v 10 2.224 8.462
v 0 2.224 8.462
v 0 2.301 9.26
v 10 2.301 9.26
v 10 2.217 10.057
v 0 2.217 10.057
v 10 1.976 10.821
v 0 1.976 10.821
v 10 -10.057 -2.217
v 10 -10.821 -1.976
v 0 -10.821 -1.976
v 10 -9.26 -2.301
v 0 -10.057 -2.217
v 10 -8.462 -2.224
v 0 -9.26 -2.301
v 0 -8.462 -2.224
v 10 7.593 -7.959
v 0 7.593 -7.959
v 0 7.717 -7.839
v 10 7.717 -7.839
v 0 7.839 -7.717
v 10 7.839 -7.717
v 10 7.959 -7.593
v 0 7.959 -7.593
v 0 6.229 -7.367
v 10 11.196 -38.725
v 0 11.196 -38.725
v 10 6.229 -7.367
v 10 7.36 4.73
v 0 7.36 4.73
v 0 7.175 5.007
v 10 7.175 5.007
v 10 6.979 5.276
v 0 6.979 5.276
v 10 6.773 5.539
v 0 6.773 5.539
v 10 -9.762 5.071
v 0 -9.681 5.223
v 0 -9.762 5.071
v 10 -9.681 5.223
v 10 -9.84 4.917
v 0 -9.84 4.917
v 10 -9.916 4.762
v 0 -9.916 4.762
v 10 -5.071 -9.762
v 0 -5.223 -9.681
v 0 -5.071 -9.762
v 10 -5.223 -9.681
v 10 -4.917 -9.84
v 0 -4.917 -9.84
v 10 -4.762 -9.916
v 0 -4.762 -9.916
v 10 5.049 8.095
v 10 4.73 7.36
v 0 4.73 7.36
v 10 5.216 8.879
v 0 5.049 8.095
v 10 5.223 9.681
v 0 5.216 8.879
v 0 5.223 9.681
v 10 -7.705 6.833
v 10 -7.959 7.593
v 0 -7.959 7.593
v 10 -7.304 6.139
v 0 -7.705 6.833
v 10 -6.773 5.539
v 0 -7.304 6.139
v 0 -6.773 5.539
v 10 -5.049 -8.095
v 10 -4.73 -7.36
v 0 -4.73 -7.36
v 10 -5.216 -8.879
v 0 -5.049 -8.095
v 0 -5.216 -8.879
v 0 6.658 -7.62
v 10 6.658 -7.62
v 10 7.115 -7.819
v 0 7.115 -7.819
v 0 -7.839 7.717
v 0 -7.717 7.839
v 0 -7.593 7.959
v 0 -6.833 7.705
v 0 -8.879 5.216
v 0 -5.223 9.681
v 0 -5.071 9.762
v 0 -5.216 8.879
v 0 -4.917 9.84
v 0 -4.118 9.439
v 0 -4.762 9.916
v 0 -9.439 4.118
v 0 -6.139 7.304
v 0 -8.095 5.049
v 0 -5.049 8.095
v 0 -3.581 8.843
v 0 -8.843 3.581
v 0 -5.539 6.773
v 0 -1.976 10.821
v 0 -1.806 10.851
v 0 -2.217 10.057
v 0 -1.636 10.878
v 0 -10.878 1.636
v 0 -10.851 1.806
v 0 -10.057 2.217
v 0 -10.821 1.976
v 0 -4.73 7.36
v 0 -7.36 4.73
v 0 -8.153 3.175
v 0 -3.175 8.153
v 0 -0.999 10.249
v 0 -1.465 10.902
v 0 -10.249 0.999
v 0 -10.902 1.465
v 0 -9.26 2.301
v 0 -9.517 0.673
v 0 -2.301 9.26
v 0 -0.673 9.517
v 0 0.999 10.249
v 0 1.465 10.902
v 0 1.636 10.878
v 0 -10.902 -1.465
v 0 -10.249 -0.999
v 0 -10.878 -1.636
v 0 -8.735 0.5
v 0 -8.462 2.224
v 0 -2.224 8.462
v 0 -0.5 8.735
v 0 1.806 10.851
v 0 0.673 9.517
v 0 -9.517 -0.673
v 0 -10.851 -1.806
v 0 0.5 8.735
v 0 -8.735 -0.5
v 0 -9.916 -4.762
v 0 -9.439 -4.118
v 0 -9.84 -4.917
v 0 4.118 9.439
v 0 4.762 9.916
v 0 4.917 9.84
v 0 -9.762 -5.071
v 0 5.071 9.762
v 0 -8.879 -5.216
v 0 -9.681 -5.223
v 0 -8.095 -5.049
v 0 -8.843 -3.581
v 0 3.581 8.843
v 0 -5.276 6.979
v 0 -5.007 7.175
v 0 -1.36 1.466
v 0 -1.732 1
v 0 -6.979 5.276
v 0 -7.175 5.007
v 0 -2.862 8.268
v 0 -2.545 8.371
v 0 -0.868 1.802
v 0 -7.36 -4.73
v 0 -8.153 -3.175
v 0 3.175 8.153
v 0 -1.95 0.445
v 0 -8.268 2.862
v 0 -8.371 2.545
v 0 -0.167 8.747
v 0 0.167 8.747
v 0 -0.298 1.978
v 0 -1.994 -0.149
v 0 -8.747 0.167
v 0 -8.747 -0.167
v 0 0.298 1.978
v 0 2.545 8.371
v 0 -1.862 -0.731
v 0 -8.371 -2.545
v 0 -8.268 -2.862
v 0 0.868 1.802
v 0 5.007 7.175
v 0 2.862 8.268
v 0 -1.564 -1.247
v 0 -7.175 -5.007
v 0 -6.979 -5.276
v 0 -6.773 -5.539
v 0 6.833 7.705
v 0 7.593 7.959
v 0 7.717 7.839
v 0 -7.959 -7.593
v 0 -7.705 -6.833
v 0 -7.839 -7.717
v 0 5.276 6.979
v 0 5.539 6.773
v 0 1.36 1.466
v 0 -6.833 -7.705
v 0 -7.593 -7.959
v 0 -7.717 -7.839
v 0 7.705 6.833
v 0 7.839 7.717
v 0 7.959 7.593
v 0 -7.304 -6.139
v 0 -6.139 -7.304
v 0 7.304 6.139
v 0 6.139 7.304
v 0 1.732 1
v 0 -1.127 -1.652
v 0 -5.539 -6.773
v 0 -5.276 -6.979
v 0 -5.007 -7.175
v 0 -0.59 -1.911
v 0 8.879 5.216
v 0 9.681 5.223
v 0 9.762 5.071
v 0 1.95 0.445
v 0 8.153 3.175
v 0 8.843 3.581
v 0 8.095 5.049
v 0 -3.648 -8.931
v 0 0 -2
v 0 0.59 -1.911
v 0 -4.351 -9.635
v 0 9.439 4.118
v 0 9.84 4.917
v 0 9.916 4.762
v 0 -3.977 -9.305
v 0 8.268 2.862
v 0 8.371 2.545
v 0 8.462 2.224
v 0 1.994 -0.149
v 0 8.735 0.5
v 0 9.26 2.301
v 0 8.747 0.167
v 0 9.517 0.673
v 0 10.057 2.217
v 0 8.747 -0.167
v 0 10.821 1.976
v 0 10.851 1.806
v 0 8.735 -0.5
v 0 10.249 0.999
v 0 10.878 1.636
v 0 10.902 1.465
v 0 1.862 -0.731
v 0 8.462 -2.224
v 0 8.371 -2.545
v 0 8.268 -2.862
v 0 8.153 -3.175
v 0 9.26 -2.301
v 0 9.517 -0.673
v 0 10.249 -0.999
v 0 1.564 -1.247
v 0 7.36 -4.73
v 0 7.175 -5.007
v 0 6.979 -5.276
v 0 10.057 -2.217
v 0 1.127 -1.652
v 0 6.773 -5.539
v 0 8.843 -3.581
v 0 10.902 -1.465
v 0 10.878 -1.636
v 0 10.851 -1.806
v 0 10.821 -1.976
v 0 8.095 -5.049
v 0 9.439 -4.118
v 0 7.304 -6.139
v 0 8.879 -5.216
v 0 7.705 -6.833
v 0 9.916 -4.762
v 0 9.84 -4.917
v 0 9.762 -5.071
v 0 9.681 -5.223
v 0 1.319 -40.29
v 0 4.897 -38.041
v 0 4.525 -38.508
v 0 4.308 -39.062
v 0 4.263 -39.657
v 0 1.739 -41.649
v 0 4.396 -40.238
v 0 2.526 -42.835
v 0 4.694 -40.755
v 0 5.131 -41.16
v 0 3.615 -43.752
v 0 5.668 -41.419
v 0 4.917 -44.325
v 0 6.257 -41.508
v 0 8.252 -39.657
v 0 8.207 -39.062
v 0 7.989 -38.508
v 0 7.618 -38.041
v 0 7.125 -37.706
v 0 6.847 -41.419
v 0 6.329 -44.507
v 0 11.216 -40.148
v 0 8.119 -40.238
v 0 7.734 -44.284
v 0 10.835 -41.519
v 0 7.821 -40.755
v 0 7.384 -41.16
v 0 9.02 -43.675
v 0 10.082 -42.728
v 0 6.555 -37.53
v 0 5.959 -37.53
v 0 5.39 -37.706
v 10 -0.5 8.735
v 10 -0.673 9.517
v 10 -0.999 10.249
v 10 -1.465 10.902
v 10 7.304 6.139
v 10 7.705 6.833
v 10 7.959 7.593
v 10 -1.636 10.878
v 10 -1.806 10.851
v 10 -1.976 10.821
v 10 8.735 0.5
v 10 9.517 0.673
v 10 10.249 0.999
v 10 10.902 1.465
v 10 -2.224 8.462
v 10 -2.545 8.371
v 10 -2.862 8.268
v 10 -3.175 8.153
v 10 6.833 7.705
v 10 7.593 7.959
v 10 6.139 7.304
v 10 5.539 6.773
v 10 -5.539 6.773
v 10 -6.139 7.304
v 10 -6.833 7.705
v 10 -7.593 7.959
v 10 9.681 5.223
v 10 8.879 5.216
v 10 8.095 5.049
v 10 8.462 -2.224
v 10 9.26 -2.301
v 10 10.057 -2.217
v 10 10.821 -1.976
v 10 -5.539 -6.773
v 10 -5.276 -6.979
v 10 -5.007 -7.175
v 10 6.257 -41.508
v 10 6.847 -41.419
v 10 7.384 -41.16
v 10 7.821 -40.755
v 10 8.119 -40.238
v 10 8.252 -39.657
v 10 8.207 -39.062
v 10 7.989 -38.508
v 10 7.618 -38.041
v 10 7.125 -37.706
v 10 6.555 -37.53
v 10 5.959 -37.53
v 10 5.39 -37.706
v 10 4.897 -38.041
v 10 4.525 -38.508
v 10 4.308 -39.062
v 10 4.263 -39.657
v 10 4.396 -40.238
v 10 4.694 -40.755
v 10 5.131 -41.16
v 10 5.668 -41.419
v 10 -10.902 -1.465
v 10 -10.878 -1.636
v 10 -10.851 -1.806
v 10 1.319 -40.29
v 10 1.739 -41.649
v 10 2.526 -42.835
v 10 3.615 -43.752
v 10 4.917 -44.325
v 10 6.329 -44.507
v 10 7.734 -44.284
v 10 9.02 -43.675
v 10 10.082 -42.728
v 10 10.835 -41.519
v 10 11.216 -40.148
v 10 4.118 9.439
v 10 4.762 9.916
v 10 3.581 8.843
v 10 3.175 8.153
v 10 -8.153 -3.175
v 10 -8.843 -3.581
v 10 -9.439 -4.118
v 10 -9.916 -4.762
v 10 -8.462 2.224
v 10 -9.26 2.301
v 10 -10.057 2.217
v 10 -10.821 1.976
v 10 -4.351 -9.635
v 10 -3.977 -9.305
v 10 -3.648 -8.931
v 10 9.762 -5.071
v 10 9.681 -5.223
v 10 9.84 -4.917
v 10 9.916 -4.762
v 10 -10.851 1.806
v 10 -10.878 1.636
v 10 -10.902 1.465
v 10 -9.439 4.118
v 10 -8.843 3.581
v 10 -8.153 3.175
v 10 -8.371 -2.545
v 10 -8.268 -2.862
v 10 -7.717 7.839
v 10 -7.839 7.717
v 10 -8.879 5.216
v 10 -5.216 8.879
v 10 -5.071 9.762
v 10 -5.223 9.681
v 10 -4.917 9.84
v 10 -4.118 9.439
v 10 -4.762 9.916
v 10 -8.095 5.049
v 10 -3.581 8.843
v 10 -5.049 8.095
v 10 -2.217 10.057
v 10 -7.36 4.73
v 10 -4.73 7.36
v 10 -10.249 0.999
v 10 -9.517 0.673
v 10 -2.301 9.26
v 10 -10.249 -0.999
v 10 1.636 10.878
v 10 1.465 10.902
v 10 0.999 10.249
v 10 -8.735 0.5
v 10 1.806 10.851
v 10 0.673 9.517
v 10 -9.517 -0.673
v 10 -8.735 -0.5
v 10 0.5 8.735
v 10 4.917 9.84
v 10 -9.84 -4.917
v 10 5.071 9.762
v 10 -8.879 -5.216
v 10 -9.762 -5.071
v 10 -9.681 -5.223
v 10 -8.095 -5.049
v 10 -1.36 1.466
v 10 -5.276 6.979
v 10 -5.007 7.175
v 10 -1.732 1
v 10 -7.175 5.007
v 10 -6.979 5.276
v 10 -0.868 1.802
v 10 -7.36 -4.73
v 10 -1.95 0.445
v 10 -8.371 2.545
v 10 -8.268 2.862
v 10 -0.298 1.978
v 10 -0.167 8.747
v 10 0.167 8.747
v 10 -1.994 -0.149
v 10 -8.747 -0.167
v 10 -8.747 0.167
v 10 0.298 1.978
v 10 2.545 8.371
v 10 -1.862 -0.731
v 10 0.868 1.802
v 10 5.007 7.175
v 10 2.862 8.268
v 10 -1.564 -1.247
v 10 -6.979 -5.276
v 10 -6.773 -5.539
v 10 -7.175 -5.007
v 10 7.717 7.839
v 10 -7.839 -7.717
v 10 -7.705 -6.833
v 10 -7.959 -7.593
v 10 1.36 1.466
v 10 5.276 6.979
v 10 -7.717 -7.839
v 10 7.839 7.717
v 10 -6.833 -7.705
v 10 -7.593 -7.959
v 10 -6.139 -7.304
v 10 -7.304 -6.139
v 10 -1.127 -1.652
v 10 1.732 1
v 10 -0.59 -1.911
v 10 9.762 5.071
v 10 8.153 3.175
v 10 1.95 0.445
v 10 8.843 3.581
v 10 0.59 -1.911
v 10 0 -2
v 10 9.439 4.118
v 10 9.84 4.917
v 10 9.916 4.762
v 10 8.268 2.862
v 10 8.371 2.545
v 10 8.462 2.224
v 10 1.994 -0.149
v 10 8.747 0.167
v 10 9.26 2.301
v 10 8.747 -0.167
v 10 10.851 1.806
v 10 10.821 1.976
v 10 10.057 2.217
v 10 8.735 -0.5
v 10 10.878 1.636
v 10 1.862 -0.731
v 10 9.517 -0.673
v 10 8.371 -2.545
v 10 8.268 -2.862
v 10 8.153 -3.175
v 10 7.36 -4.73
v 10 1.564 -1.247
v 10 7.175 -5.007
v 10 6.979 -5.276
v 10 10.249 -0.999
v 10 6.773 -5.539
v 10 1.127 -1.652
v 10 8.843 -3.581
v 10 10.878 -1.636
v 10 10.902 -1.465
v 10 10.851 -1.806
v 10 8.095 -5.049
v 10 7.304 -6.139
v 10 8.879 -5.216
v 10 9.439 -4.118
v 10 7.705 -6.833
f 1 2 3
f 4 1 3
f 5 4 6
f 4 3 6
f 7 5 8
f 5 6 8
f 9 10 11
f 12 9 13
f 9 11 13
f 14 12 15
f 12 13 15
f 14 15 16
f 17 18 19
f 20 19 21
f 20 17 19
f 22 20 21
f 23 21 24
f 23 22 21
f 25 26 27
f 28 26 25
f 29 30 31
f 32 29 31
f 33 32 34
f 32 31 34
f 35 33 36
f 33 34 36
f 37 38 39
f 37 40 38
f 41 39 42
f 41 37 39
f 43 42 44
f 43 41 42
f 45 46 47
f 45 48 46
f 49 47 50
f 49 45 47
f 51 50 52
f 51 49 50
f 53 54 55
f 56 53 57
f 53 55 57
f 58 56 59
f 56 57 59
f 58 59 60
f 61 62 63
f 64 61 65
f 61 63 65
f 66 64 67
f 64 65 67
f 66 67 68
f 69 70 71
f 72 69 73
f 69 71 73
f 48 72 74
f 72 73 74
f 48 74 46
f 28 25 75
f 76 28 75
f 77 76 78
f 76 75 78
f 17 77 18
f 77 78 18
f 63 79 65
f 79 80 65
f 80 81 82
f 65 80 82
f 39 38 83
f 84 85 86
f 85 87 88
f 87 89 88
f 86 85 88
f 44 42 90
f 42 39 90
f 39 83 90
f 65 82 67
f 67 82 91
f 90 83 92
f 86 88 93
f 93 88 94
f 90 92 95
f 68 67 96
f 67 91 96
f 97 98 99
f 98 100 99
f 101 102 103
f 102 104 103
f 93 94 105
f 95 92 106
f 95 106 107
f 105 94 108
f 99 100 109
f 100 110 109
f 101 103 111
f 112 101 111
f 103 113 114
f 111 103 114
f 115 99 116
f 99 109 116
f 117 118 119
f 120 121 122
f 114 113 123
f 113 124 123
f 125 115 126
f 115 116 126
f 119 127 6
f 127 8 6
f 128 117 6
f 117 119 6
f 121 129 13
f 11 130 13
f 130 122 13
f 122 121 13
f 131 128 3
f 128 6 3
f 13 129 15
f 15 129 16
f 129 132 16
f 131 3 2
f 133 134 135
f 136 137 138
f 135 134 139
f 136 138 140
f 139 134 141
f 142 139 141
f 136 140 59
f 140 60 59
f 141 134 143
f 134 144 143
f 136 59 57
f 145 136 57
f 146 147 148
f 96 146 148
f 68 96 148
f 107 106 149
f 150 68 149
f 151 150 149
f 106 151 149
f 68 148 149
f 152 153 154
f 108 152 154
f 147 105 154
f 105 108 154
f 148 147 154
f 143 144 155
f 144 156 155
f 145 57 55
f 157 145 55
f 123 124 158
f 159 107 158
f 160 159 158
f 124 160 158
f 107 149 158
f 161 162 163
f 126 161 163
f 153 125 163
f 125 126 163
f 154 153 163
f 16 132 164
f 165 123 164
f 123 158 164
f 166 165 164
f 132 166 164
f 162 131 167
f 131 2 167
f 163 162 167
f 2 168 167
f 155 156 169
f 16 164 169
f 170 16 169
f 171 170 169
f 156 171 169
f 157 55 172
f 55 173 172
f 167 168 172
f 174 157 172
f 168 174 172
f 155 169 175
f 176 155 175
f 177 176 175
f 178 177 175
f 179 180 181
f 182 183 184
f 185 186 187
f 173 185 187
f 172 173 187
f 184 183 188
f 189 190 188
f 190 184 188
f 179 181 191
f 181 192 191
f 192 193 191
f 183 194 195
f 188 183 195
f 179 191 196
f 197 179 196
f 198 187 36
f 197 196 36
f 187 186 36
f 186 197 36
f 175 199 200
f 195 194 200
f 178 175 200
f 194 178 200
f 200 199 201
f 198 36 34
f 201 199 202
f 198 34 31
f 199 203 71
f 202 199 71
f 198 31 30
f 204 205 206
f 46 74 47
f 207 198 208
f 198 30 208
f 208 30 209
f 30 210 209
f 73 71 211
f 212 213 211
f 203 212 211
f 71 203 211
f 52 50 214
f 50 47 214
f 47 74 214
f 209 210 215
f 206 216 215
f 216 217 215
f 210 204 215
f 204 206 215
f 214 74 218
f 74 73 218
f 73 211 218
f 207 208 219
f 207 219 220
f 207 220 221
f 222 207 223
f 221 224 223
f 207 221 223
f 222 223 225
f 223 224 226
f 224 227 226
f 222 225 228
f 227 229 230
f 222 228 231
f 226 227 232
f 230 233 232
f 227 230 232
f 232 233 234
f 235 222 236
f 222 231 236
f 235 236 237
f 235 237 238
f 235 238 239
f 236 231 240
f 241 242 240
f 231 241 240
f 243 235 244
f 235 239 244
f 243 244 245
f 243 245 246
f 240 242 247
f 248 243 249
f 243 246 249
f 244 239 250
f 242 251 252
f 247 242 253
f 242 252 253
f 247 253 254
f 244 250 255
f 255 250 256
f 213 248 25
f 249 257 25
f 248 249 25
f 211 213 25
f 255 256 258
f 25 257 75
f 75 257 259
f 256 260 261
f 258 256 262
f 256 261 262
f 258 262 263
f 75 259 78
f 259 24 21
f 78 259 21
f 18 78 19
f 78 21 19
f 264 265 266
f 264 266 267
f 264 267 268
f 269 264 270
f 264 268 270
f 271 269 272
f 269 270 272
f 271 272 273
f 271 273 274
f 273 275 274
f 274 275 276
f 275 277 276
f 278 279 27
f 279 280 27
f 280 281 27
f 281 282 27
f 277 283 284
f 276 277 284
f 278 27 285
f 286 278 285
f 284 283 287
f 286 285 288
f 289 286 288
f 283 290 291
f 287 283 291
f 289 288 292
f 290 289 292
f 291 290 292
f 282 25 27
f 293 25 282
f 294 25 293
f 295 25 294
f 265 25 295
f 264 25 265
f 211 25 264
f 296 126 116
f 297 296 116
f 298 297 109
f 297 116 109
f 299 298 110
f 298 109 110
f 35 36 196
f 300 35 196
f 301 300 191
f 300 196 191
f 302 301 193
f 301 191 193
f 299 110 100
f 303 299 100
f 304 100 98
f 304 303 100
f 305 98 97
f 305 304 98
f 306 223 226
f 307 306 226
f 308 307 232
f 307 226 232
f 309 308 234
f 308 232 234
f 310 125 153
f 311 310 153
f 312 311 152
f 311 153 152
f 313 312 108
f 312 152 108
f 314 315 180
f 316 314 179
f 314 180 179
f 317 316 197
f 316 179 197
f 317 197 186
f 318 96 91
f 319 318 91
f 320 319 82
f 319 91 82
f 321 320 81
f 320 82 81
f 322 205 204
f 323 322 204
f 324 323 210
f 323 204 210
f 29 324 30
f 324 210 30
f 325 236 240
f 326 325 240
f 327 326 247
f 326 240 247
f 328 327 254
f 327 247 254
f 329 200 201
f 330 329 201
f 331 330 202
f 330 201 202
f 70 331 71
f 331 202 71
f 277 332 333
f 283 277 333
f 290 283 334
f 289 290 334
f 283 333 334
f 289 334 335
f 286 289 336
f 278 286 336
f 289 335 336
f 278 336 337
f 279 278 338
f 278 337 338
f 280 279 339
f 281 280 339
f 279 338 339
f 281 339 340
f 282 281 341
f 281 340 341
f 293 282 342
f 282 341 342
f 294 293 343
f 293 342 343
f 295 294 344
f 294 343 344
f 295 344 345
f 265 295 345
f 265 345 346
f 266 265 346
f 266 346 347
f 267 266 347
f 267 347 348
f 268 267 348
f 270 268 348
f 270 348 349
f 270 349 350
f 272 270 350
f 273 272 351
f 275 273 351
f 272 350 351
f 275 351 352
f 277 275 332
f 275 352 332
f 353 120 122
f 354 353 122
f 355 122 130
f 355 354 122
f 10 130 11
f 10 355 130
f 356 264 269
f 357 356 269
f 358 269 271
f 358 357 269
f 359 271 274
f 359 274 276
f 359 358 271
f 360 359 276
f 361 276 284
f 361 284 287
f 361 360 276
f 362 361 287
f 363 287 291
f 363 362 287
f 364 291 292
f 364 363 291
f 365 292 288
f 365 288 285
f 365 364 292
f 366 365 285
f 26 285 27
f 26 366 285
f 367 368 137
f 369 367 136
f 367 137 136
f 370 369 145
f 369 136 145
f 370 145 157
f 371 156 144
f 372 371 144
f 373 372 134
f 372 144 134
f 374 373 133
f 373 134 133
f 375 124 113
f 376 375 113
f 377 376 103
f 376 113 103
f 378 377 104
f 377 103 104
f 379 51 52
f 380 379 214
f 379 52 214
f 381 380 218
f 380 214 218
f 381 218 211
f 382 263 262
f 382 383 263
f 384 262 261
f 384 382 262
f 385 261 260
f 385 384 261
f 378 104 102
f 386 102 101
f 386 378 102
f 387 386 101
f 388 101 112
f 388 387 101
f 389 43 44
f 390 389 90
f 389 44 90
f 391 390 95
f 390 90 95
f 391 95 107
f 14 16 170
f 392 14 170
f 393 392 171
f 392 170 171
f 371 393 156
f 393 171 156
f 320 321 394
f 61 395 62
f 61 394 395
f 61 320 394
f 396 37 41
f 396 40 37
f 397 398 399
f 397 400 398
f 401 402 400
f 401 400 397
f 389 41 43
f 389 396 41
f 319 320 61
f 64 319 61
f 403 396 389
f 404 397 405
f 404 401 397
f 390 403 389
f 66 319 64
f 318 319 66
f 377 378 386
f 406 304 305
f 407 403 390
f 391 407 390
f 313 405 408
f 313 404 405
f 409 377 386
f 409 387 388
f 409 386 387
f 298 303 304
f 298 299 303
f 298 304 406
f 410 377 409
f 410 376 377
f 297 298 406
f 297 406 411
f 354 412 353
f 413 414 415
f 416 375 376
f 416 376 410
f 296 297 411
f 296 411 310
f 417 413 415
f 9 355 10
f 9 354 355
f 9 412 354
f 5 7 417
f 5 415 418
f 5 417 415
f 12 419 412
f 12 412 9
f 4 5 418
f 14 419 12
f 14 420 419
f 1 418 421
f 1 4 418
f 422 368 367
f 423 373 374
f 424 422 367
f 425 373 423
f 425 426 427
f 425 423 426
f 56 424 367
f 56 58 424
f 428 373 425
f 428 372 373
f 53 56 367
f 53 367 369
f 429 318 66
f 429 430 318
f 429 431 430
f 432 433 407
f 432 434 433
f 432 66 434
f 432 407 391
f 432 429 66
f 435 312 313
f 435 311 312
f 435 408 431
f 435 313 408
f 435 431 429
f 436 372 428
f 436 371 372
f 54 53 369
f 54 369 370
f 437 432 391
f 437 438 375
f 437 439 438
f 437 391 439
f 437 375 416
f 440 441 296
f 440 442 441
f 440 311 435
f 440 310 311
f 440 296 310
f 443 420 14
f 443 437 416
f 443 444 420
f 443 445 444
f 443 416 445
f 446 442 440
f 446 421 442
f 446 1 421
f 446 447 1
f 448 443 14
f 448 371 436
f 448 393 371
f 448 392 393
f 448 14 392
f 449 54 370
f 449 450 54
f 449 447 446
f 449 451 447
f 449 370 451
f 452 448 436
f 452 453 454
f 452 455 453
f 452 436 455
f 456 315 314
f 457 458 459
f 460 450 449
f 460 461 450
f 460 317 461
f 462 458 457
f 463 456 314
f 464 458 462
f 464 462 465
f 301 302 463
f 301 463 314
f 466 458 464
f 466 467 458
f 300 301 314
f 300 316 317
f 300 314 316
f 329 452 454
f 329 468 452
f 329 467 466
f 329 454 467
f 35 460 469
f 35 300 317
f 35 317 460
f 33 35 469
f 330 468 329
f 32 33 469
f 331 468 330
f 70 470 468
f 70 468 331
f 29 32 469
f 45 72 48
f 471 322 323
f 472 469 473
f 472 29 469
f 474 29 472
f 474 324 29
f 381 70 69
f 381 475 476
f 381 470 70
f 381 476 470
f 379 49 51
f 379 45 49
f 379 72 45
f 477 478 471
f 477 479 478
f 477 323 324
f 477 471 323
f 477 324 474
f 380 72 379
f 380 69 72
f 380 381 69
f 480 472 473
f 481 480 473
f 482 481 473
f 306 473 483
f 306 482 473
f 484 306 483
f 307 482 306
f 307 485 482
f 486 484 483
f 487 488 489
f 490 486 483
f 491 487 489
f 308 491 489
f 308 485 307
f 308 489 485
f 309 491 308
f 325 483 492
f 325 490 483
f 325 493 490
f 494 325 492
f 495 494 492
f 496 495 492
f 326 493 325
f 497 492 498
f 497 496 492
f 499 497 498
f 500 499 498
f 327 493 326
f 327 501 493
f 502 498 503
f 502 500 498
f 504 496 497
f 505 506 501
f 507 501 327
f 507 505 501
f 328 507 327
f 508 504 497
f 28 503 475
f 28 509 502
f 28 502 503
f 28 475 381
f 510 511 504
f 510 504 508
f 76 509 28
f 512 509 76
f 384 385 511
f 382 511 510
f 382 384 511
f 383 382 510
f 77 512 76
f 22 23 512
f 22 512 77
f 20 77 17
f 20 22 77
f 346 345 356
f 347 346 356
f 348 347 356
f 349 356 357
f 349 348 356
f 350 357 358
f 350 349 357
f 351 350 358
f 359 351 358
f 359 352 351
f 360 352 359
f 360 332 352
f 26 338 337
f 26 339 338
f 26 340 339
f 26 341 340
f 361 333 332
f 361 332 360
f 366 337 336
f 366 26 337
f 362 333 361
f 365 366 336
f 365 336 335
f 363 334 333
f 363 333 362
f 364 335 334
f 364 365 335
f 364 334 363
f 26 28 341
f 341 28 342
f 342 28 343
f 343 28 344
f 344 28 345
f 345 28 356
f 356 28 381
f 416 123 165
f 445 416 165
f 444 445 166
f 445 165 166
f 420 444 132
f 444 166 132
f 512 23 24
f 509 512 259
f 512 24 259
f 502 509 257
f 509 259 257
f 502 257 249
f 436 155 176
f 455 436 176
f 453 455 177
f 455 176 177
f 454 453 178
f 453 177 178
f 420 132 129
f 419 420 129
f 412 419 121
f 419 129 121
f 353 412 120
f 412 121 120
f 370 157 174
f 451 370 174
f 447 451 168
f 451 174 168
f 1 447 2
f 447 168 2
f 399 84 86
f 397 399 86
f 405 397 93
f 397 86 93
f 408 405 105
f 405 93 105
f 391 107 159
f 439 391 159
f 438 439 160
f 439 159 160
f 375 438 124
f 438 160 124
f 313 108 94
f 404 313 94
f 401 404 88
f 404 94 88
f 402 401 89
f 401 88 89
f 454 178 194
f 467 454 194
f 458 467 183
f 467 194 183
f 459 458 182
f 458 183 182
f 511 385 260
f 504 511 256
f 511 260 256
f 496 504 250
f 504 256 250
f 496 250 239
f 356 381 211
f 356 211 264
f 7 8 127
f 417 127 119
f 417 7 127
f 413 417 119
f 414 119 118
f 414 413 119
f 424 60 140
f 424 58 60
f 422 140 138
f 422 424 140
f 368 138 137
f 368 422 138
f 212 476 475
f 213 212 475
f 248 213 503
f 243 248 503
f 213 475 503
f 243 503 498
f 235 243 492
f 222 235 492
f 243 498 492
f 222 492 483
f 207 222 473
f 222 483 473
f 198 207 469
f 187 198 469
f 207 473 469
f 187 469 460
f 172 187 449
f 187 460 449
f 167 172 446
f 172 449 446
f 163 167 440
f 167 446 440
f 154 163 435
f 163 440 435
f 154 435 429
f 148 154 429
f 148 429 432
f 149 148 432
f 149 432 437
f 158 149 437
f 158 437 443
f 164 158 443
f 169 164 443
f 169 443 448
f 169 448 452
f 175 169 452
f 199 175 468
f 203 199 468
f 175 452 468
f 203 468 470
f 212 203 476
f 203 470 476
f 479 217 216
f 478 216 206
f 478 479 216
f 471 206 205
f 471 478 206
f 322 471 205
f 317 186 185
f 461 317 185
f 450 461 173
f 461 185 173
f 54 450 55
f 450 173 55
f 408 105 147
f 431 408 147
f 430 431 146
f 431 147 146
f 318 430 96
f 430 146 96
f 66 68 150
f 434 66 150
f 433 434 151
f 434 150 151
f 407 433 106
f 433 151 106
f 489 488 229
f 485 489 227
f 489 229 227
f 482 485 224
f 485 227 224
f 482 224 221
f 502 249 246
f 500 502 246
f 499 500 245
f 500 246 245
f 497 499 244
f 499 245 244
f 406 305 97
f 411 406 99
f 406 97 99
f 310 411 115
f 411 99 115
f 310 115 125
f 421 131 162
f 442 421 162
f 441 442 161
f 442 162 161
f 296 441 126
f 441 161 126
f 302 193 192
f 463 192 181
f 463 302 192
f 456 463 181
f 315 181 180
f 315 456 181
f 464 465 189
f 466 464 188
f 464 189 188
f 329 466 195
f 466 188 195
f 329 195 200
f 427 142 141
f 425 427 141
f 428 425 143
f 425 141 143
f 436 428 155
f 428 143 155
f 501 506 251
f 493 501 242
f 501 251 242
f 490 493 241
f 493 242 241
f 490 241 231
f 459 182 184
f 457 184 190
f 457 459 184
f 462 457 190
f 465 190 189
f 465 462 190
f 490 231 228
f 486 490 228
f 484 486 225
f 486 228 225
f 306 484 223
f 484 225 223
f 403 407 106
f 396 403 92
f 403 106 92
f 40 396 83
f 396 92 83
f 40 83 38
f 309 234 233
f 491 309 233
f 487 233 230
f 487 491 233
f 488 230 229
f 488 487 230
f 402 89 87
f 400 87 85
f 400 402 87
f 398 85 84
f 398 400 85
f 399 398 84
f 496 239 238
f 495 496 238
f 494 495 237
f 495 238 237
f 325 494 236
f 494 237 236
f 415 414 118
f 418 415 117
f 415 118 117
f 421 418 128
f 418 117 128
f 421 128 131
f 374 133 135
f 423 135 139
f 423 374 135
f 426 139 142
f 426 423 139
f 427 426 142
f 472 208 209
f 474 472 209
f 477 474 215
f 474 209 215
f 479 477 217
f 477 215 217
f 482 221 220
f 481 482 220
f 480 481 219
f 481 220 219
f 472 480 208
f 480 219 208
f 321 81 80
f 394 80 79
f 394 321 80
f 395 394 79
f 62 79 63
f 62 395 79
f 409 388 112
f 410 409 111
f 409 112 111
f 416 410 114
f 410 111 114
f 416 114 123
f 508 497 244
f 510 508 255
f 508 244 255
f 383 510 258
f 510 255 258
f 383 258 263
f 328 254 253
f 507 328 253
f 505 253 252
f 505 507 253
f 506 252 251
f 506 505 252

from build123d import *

# Parameters (mm, degrees)
BASPROSKE_W             = 10
BASPROSKE_H             = 11
TOOTHCUT_DEPTH          = 19.493242009
TEETHCUTS_COUNT         = 20
TEETHCUTS_ANGLE         = 342
BORSKE_R                = 0.4
BORE_DEPTH              = 50.0000508
CROQUIS1_R              = 2
SALIENTE_EXTRUIR1_DEPTH = 10
CROQUIS2_R              = 2
CORTAR_EXTRUIR1_DEPTH   = 10


with BuildPart() as part:
    # BasProSke → Base-Revolve (revolve)
    with BuildSketch(Plane(origin=(0, 0, 0), x_dir=(1, 0, 0), z_dir=(0, 1, 0)), mode=Mode.PRIVATE) as base_revolve_sk:
        with Locations((5, 5.5)):
            Rectangle(BASPROSKE_W, BASPROSKE_H)
    revolve(base_revolve_sk.sketch.rotate(Axis((-10, 0, 0), (1, 0, 0)), 180), axis=Axis((-10, 0, 0), (1, 0, 0)))

    # TooCutSke → ToothCut (cut, through all)
    with BuildSketch(Plane(origin=(0, 0, 0), x_dir=(0, 0, -1), z_dir=(1, 0, 0))):
        with BuildLine():
            ThreePointArc((0.499924007, 8.734705318), (0, 8.749), (-0.499924007, 8.734705318))
            ThreePointArc((-0.499924007, 8.734705318), (-0.824302243, 9.905497836), (-1.485192705, 10.924909509))
            ThreePointArc((-1.485192705, 10.924909509), (0, 11.0254), (1.485192705, 10.924909509))
            ThreePointArc((1.485192705, 10.924909509), (0.824302243, 9.905497836), (0.499924007, 8.734705318))
        make_face()
    toothcut = extrude(amount=TOOTHCUT_DEPTH, mode=Mode.SUBTRACT)

    # TeethCuts: ToothCut ×20 about axis
    teethcuts_axis = Axis((-10, 0, 0), (1, 0, 0))
    for i in range(1, TEETHCUTS_COUNT):
        add(toothcut.rotate(teethcuts_axis, i * TEETHCUTS_ANGLE / (TEETHCUTS_COUNT - 1)), mode=Mode.SUBTRACT)

    # BorSke → Bore (cut, symmetric)
    with BuildSketch(Plane(origin=(0, 0, 0), x_dir=(0, 0, -1), z_dir=(1, 0, 0))):
        with Locations(Location((0, 0, 0), (0, 0, 180))):
            Circle(BORSKE_R)
    extrude(amount=BORE_DEPTH, both=True, mode=Mode.SUBTRACT)

    # Croquis1 → Saliente-Extruir1 (add)
    with BuildSketch(Plane(origin=(10, 0, 0), x_dir=(0, 0, -1), z_dir=(1, 0, 0))):
        with BuildLine():
            Line((38.725361299, 11.195820305), (-0.782172325, 4.938441703))
            ThreePointArc((-0.782172325, 4.938441703), (-4.938441703, -0.782172325), (0.782172325, -4.938441703))
            Line((0.782172325, -4.938441703), (40.289705949, 1.318936899))
            ThreePointArc((40.289705949, 1.318936899), (44.445975327, 7.039550927), (38.725361299, 11.195820305))
        make_face()
        Circle(CROQUIS1_R, mode=Mode.SUBTRACT)
        with Locations((39.507533624, 6.257378602)):
            Circle(CROQUIS1_R, mode=Mode.SUBTRACT)
    extrude(amount=-SALIENTE_EXTRUIR1_DEPTH)

    # Croquis2 → Cortar-Extruir1 (cut)
    with BuildSketch(Plane(origin=(10, 0, 0), x_dir=(0, 0, -1), z_dir=(1, 0, 0))):
        Circle(CROQUIS2_R)
    extrude(amount=-CORTAR_EXTRUIR1_DEPTH, mode=Mode.SUBTRACT)


solid = part.part
